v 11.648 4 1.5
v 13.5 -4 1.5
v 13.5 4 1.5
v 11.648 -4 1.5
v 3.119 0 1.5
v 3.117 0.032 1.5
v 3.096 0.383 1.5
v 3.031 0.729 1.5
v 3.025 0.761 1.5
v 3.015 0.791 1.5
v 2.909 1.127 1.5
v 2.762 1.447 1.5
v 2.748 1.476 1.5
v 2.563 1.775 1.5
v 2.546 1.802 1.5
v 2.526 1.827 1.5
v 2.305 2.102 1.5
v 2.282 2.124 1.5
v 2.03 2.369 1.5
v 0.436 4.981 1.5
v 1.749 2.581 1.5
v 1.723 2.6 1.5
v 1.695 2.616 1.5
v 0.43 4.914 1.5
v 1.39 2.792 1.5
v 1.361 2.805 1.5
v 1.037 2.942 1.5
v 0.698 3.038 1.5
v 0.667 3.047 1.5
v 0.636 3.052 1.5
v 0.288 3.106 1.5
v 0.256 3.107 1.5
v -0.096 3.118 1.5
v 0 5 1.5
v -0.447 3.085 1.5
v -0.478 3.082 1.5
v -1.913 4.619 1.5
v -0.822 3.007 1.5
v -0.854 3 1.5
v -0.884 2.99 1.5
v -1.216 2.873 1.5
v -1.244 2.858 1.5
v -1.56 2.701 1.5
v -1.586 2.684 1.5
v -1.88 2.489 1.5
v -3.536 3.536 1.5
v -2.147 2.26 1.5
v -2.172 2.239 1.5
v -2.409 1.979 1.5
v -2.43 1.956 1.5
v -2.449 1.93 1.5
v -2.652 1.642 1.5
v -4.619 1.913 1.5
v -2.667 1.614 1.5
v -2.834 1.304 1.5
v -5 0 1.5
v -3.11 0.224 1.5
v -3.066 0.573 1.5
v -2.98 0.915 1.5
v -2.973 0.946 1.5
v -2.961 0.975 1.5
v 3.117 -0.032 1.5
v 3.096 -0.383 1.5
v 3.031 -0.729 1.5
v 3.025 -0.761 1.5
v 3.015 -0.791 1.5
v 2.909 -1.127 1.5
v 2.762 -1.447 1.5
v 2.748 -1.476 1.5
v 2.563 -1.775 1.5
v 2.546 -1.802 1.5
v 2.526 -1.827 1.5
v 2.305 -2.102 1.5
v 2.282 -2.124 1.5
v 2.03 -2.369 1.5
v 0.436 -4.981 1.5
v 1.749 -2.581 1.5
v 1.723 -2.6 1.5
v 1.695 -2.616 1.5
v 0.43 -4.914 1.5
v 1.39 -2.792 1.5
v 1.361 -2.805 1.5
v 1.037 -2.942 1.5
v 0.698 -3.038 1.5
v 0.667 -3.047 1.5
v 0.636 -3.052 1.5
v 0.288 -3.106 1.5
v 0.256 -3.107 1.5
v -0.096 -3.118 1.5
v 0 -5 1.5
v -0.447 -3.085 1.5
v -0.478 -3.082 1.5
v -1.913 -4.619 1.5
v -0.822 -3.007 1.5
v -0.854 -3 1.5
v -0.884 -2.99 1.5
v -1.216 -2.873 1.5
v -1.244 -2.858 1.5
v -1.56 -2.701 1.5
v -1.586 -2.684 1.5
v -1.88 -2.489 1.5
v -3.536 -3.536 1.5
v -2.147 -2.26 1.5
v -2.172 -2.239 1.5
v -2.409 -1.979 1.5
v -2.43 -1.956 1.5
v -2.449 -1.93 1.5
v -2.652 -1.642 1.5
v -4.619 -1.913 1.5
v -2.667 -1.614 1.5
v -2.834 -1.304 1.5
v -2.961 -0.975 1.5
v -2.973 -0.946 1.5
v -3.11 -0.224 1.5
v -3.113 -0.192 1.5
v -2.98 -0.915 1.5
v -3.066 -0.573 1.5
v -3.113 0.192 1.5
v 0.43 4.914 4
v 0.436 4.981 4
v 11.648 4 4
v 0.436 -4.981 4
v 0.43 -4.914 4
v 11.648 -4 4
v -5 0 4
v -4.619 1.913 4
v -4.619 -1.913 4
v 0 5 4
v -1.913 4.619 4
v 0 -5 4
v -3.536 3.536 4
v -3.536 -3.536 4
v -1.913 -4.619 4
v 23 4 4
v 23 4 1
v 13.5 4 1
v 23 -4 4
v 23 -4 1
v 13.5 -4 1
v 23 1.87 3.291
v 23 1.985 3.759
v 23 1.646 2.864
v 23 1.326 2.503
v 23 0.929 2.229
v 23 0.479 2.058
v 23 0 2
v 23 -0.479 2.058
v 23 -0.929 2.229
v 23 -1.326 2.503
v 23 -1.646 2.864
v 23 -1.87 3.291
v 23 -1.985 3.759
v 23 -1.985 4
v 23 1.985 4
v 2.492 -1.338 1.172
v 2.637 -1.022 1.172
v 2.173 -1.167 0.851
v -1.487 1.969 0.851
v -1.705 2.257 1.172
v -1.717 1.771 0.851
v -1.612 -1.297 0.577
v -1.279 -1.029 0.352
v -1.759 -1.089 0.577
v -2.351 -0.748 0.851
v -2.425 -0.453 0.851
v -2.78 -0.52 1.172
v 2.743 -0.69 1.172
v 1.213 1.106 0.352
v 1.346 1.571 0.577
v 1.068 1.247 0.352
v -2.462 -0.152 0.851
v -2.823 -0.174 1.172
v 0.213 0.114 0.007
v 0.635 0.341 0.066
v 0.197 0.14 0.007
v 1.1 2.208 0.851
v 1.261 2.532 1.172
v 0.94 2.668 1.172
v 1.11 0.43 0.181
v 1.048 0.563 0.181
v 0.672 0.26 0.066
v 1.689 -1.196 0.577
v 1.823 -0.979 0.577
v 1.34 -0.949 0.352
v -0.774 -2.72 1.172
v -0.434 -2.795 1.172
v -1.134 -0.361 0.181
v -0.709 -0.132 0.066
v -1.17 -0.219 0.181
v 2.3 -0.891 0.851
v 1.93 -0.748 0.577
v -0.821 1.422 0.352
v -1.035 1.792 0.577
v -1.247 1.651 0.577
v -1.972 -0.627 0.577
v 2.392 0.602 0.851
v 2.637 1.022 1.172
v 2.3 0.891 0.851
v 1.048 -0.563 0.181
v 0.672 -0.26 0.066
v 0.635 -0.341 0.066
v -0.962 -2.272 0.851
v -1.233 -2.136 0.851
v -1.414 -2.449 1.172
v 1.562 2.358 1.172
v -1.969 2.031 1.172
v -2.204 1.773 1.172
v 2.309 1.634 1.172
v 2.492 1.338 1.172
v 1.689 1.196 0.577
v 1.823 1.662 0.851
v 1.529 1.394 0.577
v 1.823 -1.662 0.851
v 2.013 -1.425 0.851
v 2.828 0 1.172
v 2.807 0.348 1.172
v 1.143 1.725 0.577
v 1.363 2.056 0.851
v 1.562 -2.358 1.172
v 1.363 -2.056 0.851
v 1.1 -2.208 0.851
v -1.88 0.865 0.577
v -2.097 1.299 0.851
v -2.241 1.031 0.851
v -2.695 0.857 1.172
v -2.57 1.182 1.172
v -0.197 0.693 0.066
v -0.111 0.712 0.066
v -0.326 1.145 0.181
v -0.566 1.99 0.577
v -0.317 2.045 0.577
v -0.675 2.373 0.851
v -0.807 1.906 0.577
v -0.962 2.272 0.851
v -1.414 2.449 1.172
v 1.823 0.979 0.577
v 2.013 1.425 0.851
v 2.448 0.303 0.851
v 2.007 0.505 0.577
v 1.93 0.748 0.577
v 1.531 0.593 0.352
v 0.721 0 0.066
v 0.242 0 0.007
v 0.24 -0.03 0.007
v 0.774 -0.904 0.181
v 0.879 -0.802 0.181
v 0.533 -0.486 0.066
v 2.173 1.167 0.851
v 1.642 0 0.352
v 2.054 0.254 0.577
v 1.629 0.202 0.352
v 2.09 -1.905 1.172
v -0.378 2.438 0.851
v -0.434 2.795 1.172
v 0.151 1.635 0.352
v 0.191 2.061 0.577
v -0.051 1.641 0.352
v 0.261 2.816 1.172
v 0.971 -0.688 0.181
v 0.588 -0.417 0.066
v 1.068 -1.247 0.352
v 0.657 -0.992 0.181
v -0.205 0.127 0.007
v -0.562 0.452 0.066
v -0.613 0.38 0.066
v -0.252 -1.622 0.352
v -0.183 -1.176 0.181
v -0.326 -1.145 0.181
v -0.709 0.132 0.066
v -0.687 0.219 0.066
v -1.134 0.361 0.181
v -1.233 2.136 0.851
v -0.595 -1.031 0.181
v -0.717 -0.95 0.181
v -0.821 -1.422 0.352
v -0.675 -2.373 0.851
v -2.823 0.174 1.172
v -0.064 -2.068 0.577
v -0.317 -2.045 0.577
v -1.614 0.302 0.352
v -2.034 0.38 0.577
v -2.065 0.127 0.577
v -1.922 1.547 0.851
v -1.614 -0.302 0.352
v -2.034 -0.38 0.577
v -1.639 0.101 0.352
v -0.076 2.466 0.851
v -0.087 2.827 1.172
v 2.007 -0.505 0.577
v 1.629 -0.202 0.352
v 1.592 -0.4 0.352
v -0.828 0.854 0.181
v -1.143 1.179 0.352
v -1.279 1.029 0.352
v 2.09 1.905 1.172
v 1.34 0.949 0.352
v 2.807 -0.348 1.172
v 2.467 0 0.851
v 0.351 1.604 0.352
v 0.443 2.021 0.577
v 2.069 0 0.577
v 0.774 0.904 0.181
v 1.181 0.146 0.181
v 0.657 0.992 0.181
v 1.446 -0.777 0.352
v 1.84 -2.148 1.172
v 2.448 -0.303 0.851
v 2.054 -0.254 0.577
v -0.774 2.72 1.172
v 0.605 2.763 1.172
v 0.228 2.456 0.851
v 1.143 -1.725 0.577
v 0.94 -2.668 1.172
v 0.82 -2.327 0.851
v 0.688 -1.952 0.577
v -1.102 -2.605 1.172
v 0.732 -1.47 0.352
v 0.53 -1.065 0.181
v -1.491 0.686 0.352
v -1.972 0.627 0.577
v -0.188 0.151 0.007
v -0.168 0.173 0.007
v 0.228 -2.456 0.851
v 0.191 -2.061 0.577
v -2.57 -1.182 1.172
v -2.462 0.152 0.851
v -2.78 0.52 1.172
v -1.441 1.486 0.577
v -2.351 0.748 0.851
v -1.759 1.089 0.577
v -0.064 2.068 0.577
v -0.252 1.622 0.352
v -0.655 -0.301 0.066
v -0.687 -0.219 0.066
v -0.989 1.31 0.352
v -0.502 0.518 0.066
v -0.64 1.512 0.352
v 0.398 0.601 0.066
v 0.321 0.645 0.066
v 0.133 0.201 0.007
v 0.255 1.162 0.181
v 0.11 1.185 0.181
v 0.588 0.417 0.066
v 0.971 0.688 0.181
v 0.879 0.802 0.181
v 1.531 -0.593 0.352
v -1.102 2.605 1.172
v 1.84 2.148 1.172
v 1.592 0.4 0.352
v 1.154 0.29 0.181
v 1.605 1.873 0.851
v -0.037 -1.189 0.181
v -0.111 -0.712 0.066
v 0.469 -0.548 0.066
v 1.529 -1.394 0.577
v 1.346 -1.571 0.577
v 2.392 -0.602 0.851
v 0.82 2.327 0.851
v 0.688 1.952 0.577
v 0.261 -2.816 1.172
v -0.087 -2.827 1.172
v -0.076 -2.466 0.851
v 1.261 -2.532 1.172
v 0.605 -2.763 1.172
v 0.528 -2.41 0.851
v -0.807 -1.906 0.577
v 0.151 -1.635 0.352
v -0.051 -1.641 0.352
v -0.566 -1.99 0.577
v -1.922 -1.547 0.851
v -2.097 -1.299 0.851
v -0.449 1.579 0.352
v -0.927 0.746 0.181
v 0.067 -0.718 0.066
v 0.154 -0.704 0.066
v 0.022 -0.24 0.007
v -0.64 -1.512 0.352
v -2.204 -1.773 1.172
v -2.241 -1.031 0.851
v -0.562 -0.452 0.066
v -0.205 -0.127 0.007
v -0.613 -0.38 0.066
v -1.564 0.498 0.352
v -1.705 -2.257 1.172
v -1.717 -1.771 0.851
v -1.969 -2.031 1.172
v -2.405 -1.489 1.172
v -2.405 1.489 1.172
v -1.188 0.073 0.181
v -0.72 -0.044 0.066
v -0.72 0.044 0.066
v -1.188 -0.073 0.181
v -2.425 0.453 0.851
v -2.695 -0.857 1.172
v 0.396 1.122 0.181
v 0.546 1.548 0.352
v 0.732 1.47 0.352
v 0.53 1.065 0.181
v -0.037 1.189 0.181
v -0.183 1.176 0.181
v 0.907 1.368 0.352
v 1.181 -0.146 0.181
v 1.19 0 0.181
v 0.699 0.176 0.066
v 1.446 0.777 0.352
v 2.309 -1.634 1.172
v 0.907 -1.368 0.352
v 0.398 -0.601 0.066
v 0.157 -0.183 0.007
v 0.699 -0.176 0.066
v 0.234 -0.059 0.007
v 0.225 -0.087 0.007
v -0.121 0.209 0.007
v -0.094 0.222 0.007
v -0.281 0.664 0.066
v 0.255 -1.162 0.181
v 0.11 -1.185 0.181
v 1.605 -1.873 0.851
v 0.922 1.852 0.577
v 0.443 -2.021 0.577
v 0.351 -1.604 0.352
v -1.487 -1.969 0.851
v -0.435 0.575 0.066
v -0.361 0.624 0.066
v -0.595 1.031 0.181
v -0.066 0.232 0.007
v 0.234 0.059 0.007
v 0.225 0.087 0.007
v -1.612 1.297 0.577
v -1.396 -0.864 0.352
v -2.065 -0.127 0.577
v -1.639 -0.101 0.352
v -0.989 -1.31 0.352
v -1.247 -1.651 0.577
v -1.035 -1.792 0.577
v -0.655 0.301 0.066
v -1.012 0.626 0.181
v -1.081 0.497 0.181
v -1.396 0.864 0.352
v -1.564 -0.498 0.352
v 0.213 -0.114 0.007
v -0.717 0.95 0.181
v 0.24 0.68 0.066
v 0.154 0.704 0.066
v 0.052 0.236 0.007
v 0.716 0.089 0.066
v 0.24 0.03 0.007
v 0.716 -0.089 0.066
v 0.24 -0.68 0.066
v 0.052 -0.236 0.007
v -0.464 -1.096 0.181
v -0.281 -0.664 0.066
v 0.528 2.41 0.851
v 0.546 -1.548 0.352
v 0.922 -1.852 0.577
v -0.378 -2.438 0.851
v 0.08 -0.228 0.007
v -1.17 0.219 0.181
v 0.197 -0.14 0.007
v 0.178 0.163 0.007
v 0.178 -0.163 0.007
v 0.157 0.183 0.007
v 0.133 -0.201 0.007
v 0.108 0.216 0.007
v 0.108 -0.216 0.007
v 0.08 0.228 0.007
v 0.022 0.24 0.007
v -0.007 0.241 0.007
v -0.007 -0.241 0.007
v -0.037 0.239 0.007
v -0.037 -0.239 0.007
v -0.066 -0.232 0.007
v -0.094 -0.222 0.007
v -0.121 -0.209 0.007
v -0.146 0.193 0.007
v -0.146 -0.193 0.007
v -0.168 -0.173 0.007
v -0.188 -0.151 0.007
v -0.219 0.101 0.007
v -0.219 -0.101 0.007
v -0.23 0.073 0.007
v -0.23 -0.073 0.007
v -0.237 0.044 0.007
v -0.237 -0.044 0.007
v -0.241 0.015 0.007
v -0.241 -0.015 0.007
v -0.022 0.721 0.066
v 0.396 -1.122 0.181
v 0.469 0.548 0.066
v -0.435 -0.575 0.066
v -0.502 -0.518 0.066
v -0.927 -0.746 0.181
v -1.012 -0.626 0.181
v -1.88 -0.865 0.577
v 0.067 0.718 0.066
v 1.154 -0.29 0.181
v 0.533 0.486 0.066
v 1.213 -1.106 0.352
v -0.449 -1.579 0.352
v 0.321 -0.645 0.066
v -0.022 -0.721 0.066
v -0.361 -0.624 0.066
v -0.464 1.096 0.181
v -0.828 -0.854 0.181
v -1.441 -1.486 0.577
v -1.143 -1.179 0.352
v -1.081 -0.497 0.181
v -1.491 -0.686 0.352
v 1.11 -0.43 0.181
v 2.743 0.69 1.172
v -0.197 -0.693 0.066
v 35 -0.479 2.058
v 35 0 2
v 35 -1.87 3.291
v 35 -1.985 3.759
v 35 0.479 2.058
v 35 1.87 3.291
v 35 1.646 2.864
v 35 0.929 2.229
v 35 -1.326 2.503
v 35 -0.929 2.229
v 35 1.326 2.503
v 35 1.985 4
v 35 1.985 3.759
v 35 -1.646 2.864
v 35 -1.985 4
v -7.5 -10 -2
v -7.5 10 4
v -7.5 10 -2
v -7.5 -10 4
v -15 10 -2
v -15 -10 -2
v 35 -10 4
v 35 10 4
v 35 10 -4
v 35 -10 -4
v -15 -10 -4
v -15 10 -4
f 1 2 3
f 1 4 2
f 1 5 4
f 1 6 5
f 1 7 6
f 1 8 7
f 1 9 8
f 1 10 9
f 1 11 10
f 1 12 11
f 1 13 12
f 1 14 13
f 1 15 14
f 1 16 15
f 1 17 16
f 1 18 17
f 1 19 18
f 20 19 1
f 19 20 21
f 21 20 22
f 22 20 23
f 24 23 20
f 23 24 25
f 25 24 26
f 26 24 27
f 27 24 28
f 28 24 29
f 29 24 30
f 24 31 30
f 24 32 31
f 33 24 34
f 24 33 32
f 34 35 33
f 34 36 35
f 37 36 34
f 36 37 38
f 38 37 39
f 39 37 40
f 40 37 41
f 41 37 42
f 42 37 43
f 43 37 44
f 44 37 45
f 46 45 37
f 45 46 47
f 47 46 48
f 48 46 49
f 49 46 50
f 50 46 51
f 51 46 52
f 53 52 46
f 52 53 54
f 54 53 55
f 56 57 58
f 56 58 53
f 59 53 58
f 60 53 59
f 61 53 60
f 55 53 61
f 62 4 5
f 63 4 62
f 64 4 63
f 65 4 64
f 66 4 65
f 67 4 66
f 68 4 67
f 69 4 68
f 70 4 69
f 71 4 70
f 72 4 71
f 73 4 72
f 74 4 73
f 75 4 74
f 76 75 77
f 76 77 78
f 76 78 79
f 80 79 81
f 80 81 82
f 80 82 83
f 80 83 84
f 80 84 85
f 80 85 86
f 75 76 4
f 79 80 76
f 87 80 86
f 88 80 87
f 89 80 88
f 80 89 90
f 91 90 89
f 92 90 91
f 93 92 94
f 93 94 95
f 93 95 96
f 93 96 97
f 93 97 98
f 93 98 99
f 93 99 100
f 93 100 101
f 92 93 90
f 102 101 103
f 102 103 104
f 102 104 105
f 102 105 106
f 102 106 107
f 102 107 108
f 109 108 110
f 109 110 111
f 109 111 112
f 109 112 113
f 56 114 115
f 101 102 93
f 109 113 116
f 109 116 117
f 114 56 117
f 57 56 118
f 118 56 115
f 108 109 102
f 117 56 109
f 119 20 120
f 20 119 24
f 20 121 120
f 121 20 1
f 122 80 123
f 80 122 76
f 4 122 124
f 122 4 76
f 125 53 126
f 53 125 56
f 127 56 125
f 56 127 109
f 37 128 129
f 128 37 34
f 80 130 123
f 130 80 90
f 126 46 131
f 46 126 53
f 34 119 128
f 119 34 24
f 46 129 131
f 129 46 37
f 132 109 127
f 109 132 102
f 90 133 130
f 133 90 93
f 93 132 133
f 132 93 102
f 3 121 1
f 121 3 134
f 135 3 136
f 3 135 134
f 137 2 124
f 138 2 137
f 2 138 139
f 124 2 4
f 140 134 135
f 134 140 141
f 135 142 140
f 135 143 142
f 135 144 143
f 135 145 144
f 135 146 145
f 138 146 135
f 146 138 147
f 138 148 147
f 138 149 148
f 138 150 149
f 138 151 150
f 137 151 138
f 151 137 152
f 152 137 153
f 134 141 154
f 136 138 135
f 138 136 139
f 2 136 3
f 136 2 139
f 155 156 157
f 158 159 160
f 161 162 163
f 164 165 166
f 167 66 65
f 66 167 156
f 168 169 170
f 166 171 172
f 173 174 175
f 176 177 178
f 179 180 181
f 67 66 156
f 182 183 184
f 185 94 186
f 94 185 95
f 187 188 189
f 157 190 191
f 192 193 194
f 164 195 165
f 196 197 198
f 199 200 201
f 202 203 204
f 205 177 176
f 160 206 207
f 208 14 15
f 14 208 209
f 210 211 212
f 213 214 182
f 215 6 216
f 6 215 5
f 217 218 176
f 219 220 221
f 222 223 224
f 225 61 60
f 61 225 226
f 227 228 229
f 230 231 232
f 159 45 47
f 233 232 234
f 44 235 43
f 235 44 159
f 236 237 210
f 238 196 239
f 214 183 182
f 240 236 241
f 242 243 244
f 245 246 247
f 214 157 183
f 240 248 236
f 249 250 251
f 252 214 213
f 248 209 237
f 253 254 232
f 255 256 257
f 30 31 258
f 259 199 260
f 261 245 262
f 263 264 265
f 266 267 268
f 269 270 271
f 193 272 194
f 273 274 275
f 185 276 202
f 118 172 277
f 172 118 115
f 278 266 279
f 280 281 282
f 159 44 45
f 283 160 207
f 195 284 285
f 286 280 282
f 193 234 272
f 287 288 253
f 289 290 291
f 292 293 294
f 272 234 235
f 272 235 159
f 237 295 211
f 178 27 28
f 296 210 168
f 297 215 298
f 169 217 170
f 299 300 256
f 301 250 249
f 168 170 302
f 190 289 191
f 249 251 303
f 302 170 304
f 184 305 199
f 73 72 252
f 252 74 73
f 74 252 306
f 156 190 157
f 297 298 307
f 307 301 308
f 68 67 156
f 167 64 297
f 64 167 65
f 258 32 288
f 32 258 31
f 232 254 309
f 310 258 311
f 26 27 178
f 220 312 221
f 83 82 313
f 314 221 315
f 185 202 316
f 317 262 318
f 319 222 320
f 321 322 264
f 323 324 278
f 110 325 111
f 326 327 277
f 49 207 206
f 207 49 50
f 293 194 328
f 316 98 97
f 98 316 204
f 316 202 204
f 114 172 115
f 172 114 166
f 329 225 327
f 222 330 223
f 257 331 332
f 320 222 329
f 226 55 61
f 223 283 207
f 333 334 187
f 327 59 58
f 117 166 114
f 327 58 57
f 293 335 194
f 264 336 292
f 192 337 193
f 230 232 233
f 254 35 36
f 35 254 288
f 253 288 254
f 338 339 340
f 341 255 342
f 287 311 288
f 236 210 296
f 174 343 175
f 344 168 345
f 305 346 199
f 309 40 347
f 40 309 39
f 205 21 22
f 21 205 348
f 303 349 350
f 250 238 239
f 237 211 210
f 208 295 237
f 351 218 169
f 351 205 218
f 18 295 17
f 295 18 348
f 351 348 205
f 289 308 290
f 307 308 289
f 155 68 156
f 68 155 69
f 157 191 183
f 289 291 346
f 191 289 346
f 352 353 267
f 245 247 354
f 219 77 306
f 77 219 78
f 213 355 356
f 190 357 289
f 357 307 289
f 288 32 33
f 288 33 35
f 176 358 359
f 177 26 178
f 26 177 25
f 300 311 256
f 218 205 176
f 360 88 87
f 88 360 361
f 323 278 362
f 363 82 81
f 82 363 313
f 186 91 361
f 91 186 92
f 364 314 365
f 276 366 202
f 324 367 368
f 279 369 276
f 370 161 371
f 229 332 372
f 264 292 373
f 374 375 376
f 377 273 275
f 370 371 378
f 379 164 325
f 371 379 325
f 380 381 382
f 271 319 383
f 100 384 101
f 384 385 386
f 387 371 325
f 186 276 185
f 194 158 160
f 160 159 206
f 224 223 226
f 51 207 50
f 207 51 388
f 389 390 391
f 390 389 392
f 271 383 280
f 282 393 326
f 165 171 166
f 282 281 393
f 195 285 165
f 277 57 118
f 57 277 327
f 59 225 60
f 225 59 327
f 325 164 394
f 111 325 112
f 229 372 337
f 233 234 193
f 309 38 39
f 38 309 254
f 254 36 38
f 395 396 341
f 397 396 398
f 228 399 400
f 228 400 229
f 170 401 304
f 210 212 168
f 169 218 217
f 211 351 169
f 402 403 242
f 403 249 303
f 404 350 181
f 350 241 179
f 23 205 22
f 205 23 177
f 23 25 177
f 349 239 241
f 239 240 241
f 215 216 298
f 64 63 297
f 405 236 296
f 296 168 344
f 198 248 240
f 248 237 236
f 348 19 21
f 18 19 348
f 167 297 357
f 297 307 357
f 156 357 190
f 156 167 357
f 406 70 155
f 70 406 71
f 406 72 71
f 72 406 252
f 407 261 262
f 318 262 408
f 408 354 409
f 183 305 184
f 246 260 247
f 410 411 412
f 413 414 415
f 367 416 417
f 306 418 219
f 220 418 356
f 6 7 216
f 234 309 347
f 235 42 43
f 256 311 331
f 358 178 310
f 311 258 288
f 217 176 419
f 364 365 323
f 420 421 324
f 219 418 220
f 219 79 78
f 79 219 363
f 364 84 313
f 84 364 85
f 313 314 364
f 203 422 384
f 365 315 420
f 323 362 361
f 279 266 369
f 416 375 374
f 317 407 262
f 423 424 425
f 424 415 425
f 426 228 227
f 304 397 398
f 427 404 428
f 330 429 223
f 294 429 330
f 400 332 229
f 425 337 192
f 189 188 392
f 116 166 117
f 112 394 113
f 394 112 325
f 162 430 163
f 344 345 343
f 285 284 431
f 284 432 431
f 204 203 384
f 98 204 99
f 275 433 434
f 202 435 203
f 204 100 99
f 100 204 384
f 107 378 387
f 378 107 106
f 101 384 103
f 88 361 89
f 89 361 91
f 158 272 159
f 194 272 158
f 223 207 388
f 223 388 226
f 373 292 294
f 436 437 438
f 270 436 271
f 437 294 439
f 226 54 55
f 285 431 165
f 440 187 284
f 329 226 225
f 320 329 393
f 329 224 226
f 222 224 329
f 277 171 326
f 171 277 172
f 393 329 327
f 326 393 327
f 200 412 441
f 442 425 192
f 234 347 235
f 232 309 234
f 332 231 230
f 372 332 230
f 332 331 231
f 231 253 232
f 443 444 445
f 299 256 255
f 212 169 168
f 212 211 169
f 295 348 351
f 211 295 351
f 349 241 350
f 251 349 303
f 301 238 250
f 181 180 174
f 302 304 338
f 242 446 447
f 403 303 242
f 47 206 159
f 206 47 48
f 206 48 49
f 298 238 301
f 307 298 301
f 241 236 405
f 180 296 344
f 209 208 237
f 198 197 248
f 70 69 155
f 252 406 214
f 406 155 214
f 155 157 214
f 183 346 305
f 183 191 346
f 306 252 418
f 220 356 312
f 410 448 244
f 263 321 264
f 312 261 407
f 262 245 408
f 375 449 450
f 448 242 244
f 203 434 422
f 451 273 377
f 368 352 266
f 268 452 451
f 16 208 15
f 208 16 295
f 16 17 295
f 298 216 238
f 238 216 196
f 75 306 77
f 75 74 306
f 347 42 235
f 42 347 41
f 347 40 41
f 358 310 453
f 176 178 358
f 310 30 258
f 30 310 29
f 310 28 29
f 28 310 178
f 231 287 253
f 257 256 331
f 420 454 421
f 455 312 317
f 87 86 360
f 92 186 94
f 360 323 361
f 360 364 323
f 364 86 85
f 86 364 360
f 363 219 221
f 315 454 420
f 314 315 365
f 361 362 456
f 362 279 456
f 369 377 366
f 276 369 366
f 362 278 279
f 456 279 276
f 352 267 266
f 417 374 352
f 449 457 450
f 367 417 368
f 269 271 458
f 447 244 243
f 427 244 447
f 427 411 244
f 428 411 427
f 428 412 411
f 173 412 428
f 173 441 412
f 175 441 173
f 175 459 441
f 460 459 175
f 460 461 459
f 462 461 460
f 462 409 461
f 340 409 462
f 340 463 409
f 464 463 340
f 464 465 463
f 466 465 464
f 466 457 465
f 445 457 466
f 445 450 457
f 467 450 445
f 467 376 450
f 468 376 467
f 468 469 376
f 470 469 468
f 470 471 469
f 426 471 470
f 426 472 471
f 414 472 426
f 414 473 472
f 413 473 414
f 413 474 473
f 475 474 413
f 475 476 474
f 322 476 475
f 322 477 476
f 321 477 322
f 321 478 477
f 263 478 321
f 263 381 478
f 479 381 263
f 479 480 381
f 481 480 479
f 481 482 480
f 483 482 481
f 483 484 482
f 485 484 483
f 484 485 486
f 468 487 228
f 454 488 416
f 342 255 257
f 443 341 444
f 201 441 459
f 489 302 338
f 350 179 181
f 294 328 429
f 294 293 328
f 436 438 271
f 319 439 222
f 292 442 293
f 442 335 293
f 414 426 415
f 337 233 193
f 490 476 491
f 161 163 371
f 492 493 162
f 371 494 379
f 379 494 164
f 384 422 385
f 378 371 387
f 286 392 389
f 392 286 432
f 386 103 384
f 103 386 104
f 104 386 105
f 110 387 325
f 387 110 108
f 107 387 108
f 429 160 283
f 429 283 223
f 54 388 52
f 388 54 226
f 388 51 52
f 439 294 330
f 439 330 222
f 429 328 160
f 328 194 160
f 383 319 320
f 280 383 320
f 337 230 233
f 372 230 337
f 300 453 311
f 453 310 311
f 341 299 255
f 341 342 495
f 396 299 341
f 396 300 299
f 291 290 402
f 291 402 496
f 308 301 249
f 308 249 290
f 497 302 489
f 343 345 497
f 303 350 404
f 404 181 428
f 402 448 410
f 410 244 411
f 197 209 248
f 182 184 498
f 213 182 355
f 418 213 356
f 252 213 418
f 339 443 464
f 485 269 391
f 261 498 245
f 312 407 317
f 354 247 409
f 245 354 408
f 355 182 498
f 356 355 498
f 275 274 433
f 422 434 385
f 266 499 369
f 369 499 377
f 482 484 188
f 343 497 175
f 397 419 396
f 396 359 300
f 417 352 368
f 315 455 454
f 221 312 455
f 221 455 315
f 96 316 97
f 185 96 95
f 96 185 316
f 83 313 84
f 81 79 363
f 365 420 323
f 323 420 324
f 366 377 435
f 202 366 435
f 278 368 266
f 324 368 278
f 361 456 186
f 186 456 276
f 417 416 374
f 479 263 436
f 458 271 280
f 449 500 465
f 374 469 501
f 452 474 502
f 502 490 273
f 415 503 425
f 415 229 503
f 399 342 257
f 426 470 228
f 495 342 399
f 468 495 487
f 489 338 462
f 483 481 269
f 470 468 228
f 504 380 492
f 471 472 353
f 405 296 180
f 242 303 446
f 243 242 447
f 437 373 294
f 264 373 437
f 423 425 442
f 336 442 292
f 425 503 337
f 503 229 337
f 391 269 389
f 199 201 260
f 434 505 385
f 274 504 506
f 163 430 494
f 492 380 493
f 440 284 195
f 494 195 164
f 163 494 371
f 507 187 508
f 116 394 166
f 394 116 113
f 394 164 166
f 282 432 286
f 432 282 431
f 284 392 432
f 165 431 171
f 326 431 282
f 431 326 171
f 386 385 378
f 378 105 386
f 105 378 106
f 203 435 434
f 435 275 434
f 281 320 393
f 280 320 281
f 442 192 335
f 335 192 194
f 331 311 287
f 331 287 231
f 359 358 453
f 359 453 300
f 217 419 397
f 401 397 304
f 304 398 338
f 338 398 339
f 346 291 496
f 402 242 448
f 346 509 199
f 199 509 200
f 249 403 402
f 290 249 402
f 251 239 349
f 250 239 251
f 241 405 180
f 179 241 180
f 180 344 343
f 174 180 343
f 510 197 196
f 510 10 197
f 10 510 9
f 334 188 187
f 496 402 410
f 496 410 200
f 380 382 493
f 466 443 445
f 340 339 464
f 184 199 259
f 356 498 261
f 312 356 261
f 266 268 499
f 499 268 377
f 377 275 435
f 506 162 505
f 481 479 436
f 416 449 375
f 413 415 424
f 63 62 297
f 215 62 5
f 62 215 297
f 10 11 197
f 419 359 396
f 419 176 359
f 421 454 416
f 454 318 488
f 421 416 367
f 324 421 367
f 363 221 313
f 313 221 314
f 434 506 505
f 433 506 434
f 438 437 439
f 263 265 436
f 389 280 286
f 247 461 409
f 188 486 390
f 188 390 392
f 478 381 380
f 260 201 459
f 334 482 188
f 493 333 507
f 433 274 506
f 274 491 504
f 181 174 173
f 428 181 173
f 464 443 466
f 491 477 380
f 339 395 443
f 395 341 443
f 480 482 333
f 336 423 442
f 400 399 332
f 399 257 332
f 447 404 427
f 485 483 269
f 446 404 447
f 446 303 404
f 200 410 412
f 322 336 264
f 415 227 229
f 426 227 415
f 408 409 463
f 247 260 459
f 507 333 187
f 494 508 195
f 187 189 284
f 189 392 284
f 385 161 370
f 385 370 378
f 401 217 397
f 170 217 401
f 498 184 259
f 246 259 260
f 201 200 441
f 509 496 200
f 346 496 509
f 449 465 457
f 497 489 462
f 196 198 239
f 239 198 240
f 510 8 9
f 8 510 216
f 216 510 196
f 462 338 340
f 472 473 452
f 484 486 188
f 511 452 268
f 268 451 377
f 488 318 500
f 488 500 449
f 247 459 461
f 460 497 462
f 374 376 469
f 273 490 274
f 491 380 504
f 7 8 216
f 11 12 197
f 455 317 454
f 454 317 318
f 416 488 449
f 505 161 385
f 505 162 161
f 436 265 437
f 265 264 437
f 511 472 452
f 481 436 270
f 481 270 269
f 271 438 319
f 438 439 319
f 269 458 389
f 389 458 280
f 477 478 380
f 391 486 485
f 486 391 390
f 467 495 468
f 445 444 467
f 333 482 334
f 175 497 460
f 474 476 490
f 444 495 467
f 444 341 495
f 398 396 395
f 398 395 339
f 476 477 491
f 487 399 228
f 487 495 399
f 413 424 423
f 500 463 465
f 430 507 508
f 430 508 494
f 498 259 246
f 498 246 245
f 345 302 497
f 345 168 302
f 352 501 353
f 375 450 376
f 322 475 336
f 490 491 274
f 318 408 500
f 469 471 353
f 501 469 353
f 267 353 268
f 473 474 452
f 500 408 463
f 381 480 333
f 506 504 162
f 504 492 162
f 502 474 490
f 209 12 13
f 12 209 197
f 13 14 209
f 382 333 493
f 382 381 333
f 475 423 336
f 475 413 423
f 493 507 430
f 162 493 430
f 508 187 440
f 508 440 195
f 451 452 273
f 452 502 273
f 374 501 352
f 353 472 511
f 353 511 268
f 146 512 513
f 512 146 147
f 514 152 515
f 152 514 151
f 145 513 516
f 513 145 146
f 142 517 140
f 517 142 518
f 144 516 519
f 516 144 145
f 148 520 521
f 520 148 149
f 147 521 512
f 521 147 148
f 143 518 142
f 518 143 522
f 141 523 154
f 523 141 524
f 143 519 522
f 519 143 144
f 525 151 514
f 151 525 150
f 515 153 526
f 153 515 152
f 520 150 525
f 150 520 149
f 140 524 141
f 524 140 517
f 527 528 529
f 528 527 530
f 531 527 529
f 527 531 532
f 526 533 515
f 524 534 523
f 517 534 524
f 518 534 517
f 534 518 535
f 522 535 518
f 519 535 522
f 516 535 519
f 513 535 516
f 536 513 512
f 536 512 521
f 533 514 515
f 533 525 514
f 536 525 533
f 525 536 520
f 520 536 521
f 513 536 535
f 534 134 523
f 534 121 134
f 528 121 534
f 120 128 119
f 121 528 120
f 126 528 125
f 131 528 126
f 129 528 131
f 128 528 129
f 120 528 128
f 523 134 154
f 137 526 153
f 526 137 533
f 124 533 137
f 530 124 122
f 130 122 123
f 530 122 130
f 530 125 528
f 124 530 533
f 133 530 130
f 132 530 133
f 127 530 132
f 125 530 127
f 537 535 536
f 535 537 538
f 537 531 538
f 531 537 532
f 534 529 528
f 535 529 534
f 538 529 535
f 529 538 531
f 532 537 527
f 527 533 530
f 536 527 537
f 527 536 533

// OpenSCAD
// file: ../standard_parts/ball_link.scad
include <../configuration.scad>;

$fn=16;

ball_link();

module ball_link() {
	color("DarkSlateGray") difference() {
		union() {
			cylinder(h = 5, r = 5, center = true);
			translate([(23-9)/2,0,0]) cube([23-9,8,5],true);
			translate([23-(9.5)/2,0,0]) cube([9.5,8,6],true);
			for(m = [0,1]) mirror([ 0, m, 0 ]) rotate([0,0,-5]) translate([0,0,-2.5]) cube([12,5,5],false);
		}
		sphere(r=3,center = true);
		cylinder(h = 10, r = 2.8, center = true);
		//sphere(r= 4);
	}
}
// file: ../configuration.scad
$fa = 2;
$fs = 0.5;

motor_end_height=44;
idler_end_height=28;
carriage_height=13.8;
platform_thickness=10;
platform_fix_dia=28;
platform_dia=38;

bearing_diameter=16;
bearing_dia_clearence=0.5;
bearing_free_dia_clearence=0.8;

hotend_diameter=16.4;
hotend_groove_dia=12;

// Frames

// Places mounting holes for the controller
// 33 = RAMPS 1.3 (Power outputs: Extruder, Bed, Fan)
// 34 = RAMPS 1.3 (Power outputs: Extruder0, Extruder1, Bed)
// 35 = RAMPS 1.3 (Power outputs: Extruder, Fan, Fan)
// 70 = Megatronics
// 701 = Megatronics 2.0

motherboard=35;

frame_thickness=8;

// Distance from motor axle to idler axle
// Calculated regarding length of the HTD3M closed belt 
belt_tooth=354;
spacing = round(((belt_tooth*3) - 3.14159 * 24.83) / 2);

rod_length=spacing+55;
rod_diameter=8;
//platform_hinge_offset=25;
//carriage_hinge_offset=17;

printbed_diameter=170;	//printable aera
printbed_thickness=4;		// used for rendering and approximating build volume


//corner_radius=12;
//frame_radius=(tower_radius-rod_diameter/2-corner_radius)/cos(30);

ball_link_distance=40;//55;
ball_offset=6.5;
ball_distance=ball_link_distance-2*ball_offset;
ball_angle=25;

// Delta Settings

delta_smooth_rod_offset=139.5;//140 - 152 floor(printbed_diameter/(2*sin(ball_angle))-printbed_diameter/2+delta_effector_offset+delta_carriage_offset)
delta_effector_offset=18;
delta_carriage_offset=18;
delta_diagonal_rod=ceil(max(printbed_diameter/2+delta_smooth_rod_offset-delta_effector_offset-delta_carriage_offset,printbed_diameter/(2*sin(ball_angle))));
//|-> 202
delta_radius=(delta_smooth_rod_offset-delta_effector_offset-delta_carriage_offset);

diagonal_rod_length=delta_diagonal_rod-2*8;//165
diagonal_rod_diameter=3;
diagonal_rod_length_lost=(printbed_diameter/(2*sin(ball_angle)))-(printbed_diameter/2+delta_smooth_rod_offset-delta_effector_offset-delta_carriage_offset);

diagonal_rod_angle=acos(delta_radius/delta_diagonal_rod);

echo_result=true;

carriage_altitude=sqrt(pow(delta_diagonal_rod,2)-pow(delta_radius,2));



if(echo_result) {
	echo("printbed_diameter",printbed_diameter);
	echo("delta_diagonal_rod",delta_diagonal_rod);
	echo("diagonal_rod_length",diagonal_rod_length);
	echo("delta_effector_offset",delta_effector_offset);
	echo("delta_carriage_offset",delta_carriage_offset);
	echo("delta_radius",delta_radius);
	echo("diagonal_rod_angle",diagonal_rod_angle);
	echo("carriage_altitude",carriage_altitude);
	echo("diagonal_rod_length_lost",diagonal_rod_length_lost);
	echo("delta_smooth_rod_offset_optimum",printbed_diameter/(2*sin(ball_angle))-printbed_diameter/2+delta_effector_offset+delta_carriage_offset);
	echo("rod_length",rod_length);
}
// main file
include <../configuration.scad>;
use <../standard_parts/ball_link.scad>


difference() {
translate([10,0,0]) cube([50,20,8],true);
translate([0,0,4]) union() {
ball_link();
sphere(r = 4);
translate([20,0,0]) rotate([0,90,0]) cylinder(h = 40, r = 4/2, center = true);
translate([-15,0,-2]) cube([15,30,8],true);
}
}
